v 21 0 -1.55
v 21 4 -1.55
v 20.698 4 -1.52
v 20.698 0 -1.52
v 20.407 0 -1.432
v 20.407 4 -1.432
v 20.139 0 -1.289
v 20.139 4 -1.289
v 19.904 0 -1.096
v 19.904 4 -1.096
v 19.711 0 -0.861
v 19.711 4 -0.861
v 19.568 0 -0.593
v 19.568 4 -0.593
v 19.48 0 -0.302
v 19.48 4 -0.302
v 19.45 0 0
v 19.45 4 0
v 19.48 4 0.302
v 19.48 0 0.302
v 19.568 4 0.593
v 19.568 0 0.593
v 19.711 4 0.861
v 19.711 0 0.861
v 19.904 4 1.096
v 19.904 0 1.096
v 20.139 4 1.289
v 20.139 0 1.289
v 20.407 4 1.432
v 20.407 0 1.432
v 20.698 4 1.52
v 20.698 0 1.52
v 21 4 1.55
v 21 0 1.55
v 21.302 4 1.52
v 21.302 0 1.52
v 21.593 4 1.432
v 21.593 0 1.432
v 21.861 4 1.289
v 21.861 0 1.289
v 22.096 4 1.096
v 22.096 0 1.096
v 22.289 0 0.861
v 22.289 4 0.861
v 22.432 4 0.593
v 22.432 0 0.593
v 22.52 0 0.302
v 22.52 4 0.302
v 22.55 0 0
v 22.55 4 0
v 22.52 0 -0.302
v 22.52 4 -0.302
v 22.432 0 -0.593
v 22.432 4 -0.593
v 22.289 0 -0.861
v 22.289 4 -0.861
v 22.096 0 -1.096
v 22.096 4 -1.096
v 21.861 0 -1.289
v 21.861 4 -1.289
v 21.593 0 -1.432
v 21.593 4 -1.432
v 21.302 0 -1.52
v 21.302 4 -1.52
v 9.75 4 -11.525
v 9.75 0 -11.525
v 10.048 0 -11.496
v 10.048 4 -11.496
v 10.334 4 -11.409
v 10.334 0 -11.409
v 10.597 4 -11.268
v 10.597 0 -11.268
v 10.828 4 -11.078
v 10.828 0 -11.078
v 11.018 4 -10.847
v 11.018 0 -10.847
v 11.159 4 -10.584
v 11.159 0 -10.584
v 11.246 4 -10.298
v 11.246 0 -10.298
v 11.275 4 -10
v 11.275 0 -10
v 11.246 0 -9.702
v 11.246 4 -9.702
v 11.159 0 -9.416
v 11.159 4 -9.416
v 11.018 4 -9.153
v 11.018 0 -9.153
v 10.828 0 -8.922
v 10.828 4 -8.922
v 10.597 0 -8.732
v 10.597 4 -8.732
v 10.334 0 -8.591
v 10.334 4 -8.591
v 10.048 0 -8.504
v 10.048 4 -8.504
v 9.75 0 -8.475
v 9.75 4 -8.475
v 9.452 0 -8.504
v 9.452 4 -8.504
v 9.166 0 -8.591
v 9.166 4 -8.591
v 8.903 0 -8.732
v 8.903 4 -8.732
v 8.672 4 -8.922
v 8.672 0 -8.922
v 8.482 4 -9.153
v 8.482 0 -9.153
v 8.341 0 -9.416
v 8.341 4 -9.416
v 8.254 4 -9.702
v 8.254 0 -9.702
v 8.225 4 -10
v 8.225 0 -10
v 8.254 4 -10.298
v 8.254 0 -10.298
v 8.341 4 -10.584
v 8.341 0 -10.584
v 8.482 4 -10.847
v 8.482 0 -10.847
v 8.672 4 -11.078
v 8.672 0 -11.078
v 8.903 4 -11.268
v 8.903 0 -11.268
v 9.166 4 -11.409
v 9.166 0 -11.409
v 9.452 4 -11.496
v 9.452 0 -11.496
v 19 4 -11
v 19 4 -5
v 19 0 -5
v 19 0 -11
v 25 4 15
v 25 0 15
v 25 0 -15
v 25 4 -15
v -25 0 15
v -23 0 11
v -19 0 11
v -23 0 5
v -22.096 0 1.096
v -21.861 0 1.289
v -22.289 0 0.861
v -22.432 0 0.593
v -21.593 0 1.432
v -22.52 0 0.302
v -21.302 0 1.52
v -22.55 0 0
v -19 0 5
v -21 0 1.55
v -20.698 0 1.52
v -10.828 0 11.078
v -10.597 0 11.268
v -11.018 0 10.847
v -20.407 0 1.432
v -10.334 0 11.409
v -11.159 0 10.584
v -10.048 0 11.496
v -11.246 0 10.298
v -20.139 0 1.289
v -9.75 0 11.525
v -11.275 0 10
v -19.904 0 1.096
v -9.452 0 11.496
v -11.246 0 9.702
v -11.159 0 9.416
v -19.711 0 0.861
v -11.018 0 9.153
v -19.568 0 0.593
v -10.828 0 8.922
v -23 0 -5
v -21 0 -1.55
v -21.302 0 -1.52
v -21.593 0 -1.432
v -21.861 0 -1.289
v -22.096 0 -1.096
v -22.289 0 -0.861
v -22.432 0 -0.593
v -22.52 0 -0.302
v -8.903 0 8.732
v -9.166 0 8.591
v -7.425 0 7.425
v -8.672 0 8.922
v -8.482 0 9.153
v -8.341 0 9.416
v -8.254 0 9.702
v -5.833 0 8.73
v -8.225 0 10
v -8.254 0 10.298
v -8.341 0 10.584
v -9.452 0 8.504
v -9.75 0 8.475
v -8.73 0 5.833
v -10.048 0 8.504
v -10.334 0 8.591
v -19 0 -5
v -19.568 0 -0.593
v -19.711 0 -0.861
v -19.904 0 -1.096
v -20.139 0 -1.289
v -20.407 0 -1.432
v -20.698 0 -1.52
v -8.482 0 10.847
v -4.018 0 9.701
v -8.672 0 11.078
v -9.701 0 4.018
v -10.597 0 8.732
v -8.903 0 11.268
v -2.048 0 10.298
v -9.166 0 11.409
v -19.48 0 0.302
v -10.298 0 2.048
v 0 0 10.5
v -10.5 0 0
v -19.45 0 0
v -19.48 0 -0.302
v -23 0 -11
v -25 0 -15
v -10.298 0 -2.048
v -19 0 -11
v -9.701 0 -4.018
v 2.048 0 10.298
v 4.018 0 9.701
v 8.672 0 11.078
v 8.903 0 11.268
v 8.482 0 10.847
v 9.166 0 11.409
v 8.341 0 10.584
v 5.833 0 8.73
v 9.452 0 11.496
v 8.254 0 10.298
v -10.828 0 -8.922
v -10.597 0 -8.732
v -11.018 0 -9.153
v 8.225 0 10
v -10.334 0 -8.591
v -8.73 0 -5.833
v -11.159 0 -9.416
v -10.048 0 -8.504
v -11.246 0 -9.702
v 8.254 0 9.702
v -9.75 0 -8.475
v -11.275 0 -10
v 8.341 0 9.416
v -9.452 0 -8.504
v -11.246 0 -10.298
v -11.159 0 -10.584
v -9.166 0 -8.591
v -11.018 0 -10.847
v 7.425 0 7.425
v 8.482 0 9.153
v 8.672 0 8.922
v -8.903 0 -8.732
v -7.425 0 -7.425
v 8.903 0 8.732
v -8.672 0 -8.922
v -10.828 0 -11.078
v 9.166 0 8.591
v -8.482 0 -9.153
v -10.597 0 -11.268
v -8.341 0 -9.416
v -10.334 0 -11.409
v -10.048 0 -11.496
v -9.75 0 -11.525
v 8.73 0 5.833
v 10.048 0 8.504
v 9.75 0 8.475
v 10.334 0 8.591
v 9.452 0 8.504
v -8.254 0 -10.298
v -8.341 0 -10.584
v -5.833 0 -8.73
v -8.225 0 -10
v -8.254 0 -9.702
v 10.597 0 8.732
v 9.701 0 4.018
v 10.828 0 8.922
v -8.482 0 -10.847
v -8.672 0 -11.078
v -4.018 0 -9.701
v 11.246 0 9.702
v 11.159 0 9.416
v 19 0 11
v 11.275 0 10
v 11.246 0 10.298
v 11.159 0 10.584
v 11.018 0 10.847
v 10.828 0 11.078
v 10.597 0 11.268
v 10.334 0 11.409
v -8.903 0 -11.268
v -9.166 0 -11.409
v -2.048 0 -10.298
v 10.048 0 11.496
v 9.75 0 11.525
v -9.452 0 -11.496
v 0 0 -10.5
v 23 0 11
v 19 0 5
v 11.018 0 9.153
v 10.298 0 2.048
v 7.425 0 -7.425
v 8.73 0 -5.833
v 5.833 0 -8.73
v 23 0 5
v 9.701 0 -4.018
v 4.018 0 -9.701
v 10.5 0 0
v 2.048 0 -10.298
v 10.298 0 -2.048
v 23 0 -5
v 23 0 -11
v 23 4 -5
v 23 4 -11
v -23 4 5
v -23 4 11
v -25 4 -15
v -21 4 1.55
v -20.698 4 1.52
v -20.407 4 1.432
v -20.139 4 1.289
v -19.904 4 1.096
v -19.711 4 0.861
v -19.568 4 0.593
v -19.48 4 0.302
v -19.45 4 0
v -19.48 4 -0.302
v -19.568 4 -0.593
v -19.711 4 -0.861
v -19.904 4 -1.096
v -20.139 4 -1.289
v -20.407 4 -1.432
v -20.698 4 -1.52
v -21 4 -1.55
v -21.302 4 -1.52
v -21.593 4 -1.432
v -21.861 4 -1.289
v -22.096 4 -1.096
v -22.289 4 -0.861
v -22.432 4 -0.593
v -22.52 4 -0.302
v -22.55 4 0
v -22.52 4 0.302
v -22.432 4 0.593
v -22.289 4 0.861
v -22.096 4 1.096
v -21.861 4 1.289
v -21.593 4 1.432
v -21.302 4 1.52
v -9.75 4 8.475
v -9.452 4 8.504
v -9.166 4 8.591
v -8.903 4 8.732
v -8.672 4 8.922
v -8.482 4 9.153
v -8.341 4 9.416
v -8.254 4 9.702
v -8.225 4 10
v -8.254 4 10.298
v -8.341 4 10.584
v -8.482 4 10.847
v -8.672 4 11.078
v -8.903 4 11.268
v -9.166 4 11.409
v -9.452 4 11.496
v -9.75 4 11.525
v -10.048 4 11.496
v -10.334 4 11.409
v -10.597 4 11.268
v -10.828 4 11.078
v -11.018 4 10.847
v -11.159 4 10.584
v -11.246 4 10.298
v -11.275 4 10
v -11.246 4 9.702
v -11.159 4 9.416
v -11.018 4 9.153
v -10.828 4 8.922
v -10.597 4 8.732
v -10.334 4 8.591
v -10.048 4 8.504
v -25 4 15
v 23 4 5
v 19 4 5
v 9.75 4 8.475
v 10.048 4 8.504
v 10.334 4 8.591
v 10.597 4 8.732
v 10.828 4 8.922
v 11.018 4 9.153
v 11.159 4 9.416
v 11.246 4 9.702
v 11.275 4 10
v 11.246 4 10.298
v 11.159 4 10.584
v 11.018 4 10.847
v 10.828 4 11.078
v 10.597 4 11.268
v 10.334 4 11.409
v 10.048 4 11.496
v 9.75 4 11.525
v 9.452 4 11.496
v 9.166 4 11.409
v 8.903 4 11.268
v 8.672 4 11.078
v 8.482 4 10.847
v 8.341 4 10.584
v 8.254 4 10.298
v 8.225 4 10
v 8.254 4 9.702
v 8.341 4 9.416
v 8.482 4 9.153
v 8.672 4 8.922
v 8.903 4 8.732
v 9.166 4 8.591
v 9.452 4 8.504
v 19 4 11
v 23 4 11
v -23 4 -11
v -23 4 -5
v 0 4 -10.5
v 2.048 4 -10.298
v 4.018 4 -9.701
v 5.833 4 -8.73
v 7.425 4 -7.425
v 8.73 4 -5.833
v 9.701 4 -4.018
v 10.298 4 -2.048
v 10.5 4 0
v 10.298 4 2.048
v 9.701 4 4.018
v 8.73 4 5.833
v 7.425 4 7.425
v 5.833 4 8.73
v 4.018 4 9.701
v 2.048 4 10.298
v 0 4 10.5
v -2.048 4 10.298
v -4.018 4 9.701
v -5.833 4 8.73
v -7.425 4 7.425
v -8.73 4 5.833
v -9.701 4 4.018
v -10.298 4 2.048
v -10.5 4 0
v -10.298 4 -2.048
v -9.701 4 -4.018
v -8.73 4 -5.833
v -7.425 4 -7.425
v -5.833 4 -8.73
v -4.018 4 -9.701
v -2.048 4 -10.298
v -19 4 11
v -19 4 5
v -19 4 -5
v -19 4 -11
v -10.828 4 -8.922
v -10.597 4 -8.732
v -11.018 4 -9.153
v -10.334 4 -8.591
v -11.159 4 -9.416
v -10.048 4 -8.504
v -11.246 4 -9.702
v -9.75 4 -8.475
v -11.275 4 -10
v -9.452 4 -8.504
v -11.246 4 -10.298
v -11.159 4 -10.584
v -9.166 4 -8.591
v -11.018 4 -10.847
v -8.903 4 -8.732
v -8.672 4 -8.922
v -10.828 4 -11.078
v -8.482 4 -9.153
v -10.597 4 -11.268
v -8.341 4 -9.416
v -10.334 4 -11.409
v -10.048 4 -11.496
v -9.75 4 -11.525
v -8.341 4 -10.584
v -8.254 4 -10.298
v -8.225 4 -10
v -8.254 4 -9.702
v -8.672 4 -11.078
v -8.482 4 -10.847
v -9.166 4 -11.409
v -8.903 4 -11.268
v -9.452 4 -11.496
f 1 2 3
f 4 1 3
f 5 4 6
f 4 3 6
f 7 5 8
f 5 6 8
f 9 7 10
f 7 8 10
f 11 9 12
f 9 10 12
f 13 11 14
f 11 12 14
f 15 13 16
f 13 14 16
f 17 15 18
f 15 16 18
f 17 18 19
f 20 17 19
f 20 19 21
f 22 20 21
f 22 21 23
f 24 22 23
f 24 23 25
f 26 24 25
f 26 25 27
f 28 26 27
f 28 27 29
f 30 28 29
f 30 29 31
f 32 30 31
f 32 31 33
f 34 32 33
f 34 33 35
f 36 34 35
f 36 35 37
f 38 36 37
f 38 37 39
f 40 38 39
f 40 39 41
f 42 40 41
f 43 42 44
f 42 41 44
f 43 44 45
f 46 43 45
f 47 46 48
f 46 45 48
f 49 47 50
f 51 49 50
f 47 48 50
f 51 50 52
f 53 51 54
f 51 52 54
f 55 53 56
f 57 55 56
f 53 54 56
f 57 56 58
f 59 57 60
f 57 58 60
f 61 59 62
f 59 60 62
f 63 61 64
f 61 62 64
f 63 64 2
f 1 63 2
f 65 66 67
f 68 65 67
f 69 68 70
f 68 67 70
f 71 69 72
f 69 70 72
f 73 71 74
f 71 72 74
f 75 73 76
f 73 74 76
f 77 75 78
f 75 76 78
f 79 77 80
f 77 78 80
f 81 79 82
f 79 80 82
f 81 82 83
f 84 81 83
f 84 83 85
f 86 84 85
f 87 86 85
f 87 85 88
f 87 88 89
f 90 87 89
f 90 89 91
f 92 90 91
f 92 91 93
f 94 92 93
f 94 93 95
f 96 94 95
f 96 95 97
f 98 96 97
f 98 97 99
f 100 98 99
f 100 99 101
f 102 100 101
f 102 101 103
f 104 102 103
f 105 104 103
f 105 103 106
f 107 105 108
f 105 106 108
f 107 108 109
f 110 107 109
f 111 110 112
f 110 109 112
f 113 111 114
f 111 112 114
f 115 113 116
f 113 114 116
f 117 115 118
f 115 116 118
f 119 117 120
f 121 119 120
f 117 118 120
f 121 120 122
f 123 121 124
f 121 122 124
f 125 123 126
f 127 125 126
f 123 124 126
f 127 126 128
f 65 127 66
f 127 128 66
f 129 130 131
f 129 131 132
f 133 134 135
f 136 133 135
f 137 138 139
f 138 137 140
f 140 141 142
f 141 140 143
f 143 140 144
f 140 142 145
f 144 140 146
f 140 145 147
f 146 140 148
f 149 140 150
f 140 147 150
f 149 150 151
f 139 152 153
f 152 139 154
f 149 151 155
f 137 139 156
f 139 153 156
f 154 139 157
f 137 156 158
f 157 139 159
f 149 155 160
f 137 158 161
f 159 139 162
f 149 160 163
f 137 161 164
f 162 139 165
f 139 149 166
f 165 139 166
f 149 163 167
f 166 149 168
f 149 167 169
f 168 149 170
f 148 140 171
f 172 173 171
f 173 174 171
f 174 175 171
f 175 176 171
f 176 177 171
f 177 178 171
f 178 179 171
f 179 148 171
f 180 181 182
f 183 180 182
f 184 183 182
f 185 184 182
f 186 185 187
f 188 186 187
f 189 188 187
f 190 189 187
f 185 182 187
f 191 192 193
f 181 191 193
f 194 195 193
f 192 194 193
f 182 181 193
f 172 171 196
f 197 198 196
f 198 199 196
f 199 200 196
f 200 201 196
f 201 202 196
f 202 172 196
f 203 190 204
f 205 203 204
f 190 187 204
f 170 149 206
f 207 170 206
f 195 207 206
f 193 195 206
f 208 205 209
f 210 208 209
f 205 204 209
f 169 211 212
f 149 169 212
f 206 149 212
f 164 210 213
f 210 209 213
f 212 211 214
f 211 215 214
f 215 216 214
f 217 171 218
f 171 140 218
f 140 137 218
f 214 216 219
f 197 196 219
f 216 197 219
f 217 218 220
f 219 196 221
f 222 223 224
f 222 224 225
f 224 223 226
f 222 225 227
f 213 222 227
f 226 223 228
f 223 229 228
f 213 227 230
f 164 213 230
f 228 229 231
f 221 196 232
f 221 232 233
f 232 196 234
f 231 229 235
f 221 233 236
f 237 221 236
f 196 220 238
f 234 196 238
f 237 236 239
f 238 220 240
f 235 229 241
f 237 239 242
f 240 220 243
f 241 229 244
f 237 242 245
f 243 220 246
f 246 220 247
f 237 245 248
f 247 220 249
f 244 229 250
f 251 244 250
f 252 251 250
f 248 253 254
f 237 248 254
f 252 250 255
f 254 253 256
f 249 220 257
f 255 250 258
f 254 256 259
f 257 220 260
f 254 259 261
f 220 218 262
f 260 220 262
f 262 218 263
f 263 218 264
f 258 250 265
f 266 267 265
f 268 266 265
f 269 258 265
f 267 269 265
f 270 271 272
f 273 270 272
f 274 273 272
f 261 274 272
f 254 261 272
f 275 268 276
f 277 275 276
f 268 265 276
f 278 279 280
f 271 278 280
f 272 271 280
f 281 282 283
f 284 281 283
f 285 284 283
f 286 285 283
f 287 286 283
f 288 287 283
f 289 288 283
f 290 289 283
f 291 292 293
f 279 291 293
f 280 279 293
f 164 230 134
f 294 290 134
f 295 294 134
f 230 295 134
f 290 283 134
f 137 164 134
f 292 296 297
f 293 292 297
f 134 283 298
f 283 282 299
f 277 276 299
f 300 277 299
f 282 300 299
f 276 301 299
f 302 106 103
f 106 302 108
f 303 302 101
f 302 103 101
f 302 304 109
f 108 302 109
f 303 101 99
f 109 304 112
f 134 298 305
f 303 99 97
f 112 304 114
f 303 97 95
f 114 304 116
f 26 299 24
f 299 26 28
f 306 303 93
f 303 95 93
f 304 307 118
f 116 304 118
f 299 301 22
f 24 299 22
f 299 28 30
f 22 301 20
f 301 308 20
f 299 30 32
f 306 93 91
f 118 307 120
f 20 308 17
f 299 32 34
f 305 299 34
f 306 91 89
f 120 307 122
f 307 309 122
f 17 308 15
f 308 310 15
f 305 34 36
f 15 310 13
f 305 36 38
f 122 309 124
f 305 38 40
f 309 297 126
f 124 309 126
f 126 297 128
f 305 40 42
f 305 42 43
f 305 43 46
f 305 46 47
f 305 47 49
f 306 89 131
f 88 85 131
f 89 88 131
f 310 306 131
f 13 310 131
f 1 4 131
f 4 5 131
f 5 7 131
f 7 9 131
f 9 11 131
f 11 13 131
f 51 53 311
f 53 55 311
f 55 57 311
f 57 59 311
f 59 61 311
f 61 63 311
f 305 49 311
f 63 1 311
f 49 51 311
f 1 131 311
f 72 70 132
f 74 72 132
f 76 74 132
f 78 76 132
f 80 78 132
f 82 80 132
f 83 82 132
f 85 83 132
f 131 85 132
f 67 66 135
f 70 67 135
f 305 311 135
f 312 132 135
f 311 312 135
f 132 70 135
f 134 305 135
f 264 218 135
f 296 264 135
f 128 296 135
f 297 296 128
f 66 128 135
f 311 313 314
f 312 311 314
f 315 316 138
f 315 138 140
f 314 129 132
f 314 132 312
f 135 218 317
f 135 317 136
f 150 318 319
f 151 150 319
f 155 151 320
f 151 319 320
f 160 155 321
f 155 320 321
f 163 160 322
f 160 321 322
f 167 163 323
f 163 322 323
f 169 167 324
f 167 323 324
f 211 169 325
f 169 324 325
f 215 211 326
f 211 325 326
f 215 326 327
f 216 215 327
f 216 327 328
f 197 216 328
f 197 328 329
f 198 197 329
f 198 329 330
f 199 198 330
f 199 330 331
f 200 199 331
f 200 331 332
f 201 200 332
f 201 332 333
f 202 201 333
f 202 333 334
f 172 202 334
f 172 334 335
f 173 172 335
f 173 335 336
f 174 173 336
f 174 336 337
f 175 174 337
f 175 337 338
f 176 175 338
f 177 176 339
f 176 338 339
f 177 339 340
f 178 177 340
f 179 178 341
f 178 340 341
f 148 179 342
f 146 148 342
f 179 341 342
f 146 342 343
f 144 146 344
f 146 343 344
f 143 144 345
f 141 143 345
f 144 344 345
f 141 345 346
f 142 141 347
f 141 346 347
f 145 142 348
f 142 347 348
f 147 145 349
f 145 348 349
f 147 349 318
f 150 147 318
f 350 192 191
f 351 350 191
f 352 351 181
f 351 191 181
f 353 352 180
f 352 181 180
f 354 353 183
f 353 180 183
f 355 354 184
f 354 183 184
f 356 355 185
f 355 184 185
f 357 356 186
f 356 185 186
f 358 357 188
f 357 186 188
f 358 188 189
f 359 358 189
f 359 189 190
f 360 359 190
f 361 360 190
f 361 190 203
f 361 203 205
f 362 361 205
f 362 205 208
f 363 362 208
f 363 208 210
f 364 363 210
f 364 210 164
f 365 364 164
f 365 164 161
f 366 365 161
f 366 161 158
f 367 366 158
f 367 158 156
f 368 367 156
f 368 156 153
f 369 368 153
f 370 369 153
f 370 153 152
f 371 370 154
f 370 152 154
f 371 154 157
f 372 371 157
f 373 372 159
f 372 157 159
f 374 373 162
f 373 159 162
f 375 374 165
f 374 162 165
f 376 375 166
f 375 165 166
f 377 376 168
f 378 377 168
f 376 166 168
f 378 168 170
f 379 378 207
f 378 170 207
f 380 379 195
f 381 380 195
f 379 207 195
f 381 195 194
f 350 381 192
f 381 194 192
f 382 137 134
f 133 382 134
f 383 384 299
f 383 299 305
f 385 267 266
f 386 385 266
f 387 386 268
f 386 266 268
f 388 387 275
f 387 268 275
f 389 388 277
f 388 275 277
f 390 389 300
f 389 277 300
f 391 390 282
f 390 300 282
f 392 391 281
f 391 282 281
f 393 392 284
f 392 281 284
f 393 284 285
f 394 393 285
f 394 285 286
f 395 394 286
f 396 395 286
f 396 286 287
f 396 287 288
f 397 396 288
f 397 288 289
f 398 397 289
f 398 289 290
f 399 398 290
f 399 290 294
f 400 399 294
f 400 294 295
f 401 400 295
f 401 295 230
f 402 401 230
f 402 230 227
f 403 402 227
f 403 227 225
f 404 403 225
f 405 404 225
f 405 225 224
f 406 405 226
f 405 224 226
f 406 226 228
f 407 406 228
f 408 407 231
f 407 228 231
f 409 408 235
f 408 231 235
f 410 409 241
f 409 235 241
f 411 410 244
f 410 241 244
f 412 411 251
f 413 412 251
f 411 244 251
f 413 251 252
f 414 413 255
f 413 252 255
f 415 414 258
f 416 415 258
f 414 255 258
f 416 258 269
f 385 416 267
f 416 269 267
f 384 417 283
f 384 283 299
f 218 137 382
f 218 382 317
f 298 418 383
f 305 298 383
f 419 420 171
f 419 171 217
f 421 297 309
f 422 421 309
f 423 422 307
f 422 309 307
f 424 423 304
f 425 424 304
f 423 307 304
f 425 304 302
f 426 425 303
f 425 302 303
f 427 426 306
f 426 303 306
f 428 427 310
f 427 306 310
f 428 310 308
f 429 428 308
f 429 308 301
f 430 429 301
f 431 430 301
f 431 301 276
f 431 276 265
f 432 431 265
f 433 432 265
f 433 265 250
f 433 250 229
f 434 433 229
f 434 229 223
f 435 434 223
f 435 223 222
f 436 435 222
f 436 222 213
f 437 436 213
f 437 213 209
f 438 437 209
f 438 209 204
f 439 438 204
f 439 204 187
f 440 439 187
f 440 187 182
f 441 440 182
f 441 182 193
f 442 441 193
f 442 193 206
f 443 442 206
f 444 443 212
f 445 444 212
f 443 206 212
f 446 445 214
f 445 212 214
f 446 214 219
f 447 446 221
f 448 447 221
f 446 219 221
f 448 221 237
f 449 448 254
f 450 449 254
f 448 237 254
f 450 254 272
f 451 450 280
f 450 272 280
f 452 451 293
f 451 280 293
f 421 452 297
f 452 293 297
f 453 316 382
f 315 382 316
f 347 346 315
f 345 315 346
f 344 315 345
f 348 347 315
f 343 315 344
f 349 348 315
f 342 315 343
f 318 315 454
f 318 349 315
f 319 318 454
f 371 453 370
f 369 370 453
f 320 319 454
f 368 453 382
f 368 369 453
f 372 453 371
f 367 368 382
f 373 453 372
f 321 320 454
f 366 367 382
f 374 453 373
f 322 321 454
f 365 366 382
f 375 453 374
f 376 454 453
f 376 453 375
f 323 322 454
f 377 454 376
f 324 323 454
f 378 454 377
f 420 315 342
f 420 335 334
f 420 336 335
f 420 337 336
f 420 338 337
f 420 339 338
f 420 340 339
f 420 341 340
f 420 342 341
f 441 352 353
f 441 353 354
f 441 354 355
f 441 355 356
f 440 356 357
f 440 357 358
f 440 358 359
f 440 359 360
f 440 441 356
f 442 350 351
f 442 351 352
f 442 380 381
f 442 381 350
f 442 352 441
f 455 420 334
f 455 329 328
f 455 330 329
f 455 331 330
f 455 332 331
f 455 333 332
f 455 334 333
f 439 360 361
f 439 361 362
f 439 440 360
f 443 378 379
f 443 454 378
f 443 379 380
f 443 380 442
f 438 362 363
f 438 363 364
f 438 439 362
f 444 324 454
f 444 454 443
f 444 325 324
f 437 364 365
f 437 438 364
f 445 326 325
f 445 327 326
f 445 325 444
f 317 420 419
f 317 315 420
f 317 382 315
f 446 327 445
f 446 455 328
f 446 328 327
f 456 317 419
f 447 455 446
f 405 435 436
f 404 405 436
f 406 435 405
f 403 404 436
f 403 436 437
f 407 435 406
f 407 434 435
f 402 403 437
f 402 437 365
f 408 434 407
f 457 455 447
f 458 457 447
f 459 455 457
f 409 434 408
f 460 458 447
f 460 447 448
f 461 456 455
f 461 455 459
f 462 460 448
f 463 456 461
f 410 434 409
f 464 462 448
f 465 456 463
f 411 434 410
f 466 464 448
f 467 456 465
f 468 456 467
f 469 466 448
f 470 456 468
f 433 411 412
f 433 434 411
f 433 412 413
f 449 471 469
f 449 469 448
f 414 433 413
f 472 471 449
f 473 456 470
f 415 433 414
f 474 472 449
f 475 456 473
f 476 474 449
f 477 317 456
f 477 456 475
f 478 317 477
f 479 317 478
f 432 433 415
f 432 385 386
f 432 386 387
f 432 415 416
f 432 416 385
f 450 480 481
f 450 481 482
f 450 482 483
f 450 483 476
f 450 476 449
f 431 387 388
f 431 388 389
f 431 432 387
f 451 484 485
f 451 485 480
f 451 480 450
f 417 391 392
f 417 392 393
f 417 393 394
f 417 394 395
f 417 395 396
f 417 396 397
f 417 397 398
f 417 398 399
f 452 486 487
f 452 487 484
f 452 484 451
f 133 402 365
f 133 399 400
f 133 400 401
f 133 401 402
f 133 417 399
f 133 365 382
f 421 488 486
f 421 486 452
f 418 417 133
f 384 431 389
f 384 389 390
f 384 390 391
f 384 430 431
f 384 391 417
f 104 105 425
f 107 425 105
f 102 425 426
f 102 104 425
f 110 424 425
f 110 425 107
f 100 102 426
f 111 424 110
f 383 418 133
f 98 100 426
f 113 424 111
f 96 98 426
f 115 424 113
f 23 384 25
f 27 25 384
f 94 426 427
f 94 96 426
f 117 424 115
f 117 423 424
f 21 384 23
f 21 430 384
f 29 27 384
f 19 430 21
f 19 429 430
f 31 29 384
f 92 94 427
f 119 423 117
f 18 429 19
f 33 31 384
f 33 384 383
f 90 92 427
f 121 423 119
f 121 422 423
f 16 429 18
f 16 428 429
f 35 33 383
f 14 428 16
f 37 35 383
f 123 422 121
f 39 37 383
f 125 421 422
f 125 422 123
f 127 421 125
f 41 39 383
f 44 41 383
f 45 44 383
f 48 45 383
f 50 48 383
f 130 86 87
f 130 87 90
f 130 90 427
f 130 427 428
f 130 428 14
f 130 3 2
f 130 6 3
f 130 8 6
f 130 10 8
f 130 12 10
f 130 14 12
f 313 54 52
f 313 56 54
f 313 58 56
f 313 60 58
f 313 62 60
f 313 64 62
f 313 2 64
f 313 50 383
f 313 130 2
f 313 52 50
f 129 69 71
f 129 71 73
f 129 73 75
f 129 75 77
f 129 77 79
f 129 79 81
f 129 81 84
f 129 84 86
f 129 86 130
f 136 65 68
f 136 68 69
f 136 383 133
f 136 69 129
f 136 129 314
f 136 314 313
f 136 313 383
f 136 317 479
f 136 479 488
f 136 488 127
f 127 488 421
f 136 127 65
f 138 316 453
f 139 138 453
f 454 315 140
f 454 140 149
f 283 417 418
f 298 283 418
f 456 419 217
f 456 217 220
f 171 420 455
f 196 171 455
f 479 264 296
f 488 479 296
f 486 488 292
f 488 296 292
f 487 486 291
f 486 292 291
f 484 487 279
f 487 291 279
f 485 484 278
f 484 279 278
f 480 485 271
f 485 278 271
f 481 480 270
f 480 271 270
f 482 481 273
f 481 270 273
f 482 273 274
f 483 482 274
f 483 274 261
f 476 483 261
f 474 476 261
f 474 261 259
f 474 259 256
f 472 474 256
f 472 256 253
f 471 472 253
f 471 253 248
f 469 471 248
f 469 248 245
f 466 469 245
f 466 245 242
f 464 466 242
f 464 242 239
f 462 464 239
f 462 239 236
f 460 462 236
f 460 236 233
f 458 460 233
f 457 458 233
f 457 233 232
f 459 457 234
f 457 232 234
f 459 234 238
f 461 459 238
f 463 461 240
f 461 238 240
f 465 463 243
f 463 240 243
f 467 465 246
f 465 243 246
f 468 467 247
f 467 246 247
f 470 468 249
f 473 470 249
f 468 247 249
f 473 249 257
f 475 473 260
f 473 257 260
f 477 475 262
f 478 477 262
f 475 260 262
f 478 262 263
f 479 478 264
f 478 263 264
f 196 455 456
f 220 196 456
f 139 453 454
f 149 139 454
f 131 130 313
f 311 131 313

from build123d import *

# Parameters (mm, degrees)
CROQUIS1_W              = 50
CROQUIS1_H              = 30
SALIENTE_EXTRUIR1_DEPTH = 4
CROQUIS2_W              = 4
CROQUIS2_H              = 6
CORTAR_EXTRUIR1_DEPTH   = 30.427877939
CROQUIS3_R              = 1.55
CORTAR_EXTRUIR2_DEPTH   = 30.427877939
CROQUIS4_R              = 10.5
CROQUIS4_R_2            = 1.525
CORTAR_EXTRUIR3_DEPTH   = 30.427877939


with BuildPart() as part:
    # Croquis1 → Saliente-Extruir1 (new body)
    with BuildSketch(Plane(origin=(0, 0, 0), x_dir=(1, 0, 0), z_dir=(0, 1, 0))):
        Rectangle(CROQUIS1_W, CROQUIS1_H)
    extrude(amount=SALIENTE_EXTRUIR1_DEPTH)

    # Croquis2 → Cortar-Extruir1 (cut, through all)
    with BuildSketch(Plane(origin=(0, 4, 0), x_dir=(1, 0, 0), z_dir=(0, 1, 0))):
        with Locations((-21, 8)):
            Rectangle(CROQUIS2_W, CROQUIS2_H)
        with Locations((-21, -8)):
            Rectangle(CROQUIS2_W, CROQUIS2_H)
        with Locations((21, -8)):
            Rectangle(CROQUIS2_W, CROQUIS2_H)
        with Locations((21, 8)):
            Rectangle(CROQUIS2_W, CROQUIS2_H)
    extrude(amount=-CORTAR_EXTRUIR1_DEPTH, mode=Mode.SUBTRACT)

    # Croquis3 → Cortar-Extruir2 (cut, through all)
    with BuildSketch(Plane(origin=(0, 4, 0), x_dir=(1, 0, 0), z_dir=(0, 1, 0))):
        with Locations((-21, 0)):
            Circle(CROQUIS3_R)
        with Locations((21, 0)):
            Circle(CROQUIS3_R)
    extrude(amount=-CORTAR_EXTRUIR2_DEPTH, mode=Mode.SUBTRACT)

    # Croquis4 → Cortar-Extruir3 (cut, through all)
    with BuildSketch(Plane.XZ):
        Circle(CROQUIS4_R)
        with Locations((-9.75, 10)):
            Circle(CROQUIS4_R_2)
        with Locations((-9.75, -10)):
            Circle(CROQUIS4_R_2)
        with Locations((9.75, -10)):
            Circle(CROQUIS4_R_2)
        with Locations((9.75, 10)):
            Circle(CROQUIS4_R_2)
    extrude(amount=-CORTAR_EXTRUIR3_DEPTH, mode=Mode.SUBTRACT)


solid = part.part
